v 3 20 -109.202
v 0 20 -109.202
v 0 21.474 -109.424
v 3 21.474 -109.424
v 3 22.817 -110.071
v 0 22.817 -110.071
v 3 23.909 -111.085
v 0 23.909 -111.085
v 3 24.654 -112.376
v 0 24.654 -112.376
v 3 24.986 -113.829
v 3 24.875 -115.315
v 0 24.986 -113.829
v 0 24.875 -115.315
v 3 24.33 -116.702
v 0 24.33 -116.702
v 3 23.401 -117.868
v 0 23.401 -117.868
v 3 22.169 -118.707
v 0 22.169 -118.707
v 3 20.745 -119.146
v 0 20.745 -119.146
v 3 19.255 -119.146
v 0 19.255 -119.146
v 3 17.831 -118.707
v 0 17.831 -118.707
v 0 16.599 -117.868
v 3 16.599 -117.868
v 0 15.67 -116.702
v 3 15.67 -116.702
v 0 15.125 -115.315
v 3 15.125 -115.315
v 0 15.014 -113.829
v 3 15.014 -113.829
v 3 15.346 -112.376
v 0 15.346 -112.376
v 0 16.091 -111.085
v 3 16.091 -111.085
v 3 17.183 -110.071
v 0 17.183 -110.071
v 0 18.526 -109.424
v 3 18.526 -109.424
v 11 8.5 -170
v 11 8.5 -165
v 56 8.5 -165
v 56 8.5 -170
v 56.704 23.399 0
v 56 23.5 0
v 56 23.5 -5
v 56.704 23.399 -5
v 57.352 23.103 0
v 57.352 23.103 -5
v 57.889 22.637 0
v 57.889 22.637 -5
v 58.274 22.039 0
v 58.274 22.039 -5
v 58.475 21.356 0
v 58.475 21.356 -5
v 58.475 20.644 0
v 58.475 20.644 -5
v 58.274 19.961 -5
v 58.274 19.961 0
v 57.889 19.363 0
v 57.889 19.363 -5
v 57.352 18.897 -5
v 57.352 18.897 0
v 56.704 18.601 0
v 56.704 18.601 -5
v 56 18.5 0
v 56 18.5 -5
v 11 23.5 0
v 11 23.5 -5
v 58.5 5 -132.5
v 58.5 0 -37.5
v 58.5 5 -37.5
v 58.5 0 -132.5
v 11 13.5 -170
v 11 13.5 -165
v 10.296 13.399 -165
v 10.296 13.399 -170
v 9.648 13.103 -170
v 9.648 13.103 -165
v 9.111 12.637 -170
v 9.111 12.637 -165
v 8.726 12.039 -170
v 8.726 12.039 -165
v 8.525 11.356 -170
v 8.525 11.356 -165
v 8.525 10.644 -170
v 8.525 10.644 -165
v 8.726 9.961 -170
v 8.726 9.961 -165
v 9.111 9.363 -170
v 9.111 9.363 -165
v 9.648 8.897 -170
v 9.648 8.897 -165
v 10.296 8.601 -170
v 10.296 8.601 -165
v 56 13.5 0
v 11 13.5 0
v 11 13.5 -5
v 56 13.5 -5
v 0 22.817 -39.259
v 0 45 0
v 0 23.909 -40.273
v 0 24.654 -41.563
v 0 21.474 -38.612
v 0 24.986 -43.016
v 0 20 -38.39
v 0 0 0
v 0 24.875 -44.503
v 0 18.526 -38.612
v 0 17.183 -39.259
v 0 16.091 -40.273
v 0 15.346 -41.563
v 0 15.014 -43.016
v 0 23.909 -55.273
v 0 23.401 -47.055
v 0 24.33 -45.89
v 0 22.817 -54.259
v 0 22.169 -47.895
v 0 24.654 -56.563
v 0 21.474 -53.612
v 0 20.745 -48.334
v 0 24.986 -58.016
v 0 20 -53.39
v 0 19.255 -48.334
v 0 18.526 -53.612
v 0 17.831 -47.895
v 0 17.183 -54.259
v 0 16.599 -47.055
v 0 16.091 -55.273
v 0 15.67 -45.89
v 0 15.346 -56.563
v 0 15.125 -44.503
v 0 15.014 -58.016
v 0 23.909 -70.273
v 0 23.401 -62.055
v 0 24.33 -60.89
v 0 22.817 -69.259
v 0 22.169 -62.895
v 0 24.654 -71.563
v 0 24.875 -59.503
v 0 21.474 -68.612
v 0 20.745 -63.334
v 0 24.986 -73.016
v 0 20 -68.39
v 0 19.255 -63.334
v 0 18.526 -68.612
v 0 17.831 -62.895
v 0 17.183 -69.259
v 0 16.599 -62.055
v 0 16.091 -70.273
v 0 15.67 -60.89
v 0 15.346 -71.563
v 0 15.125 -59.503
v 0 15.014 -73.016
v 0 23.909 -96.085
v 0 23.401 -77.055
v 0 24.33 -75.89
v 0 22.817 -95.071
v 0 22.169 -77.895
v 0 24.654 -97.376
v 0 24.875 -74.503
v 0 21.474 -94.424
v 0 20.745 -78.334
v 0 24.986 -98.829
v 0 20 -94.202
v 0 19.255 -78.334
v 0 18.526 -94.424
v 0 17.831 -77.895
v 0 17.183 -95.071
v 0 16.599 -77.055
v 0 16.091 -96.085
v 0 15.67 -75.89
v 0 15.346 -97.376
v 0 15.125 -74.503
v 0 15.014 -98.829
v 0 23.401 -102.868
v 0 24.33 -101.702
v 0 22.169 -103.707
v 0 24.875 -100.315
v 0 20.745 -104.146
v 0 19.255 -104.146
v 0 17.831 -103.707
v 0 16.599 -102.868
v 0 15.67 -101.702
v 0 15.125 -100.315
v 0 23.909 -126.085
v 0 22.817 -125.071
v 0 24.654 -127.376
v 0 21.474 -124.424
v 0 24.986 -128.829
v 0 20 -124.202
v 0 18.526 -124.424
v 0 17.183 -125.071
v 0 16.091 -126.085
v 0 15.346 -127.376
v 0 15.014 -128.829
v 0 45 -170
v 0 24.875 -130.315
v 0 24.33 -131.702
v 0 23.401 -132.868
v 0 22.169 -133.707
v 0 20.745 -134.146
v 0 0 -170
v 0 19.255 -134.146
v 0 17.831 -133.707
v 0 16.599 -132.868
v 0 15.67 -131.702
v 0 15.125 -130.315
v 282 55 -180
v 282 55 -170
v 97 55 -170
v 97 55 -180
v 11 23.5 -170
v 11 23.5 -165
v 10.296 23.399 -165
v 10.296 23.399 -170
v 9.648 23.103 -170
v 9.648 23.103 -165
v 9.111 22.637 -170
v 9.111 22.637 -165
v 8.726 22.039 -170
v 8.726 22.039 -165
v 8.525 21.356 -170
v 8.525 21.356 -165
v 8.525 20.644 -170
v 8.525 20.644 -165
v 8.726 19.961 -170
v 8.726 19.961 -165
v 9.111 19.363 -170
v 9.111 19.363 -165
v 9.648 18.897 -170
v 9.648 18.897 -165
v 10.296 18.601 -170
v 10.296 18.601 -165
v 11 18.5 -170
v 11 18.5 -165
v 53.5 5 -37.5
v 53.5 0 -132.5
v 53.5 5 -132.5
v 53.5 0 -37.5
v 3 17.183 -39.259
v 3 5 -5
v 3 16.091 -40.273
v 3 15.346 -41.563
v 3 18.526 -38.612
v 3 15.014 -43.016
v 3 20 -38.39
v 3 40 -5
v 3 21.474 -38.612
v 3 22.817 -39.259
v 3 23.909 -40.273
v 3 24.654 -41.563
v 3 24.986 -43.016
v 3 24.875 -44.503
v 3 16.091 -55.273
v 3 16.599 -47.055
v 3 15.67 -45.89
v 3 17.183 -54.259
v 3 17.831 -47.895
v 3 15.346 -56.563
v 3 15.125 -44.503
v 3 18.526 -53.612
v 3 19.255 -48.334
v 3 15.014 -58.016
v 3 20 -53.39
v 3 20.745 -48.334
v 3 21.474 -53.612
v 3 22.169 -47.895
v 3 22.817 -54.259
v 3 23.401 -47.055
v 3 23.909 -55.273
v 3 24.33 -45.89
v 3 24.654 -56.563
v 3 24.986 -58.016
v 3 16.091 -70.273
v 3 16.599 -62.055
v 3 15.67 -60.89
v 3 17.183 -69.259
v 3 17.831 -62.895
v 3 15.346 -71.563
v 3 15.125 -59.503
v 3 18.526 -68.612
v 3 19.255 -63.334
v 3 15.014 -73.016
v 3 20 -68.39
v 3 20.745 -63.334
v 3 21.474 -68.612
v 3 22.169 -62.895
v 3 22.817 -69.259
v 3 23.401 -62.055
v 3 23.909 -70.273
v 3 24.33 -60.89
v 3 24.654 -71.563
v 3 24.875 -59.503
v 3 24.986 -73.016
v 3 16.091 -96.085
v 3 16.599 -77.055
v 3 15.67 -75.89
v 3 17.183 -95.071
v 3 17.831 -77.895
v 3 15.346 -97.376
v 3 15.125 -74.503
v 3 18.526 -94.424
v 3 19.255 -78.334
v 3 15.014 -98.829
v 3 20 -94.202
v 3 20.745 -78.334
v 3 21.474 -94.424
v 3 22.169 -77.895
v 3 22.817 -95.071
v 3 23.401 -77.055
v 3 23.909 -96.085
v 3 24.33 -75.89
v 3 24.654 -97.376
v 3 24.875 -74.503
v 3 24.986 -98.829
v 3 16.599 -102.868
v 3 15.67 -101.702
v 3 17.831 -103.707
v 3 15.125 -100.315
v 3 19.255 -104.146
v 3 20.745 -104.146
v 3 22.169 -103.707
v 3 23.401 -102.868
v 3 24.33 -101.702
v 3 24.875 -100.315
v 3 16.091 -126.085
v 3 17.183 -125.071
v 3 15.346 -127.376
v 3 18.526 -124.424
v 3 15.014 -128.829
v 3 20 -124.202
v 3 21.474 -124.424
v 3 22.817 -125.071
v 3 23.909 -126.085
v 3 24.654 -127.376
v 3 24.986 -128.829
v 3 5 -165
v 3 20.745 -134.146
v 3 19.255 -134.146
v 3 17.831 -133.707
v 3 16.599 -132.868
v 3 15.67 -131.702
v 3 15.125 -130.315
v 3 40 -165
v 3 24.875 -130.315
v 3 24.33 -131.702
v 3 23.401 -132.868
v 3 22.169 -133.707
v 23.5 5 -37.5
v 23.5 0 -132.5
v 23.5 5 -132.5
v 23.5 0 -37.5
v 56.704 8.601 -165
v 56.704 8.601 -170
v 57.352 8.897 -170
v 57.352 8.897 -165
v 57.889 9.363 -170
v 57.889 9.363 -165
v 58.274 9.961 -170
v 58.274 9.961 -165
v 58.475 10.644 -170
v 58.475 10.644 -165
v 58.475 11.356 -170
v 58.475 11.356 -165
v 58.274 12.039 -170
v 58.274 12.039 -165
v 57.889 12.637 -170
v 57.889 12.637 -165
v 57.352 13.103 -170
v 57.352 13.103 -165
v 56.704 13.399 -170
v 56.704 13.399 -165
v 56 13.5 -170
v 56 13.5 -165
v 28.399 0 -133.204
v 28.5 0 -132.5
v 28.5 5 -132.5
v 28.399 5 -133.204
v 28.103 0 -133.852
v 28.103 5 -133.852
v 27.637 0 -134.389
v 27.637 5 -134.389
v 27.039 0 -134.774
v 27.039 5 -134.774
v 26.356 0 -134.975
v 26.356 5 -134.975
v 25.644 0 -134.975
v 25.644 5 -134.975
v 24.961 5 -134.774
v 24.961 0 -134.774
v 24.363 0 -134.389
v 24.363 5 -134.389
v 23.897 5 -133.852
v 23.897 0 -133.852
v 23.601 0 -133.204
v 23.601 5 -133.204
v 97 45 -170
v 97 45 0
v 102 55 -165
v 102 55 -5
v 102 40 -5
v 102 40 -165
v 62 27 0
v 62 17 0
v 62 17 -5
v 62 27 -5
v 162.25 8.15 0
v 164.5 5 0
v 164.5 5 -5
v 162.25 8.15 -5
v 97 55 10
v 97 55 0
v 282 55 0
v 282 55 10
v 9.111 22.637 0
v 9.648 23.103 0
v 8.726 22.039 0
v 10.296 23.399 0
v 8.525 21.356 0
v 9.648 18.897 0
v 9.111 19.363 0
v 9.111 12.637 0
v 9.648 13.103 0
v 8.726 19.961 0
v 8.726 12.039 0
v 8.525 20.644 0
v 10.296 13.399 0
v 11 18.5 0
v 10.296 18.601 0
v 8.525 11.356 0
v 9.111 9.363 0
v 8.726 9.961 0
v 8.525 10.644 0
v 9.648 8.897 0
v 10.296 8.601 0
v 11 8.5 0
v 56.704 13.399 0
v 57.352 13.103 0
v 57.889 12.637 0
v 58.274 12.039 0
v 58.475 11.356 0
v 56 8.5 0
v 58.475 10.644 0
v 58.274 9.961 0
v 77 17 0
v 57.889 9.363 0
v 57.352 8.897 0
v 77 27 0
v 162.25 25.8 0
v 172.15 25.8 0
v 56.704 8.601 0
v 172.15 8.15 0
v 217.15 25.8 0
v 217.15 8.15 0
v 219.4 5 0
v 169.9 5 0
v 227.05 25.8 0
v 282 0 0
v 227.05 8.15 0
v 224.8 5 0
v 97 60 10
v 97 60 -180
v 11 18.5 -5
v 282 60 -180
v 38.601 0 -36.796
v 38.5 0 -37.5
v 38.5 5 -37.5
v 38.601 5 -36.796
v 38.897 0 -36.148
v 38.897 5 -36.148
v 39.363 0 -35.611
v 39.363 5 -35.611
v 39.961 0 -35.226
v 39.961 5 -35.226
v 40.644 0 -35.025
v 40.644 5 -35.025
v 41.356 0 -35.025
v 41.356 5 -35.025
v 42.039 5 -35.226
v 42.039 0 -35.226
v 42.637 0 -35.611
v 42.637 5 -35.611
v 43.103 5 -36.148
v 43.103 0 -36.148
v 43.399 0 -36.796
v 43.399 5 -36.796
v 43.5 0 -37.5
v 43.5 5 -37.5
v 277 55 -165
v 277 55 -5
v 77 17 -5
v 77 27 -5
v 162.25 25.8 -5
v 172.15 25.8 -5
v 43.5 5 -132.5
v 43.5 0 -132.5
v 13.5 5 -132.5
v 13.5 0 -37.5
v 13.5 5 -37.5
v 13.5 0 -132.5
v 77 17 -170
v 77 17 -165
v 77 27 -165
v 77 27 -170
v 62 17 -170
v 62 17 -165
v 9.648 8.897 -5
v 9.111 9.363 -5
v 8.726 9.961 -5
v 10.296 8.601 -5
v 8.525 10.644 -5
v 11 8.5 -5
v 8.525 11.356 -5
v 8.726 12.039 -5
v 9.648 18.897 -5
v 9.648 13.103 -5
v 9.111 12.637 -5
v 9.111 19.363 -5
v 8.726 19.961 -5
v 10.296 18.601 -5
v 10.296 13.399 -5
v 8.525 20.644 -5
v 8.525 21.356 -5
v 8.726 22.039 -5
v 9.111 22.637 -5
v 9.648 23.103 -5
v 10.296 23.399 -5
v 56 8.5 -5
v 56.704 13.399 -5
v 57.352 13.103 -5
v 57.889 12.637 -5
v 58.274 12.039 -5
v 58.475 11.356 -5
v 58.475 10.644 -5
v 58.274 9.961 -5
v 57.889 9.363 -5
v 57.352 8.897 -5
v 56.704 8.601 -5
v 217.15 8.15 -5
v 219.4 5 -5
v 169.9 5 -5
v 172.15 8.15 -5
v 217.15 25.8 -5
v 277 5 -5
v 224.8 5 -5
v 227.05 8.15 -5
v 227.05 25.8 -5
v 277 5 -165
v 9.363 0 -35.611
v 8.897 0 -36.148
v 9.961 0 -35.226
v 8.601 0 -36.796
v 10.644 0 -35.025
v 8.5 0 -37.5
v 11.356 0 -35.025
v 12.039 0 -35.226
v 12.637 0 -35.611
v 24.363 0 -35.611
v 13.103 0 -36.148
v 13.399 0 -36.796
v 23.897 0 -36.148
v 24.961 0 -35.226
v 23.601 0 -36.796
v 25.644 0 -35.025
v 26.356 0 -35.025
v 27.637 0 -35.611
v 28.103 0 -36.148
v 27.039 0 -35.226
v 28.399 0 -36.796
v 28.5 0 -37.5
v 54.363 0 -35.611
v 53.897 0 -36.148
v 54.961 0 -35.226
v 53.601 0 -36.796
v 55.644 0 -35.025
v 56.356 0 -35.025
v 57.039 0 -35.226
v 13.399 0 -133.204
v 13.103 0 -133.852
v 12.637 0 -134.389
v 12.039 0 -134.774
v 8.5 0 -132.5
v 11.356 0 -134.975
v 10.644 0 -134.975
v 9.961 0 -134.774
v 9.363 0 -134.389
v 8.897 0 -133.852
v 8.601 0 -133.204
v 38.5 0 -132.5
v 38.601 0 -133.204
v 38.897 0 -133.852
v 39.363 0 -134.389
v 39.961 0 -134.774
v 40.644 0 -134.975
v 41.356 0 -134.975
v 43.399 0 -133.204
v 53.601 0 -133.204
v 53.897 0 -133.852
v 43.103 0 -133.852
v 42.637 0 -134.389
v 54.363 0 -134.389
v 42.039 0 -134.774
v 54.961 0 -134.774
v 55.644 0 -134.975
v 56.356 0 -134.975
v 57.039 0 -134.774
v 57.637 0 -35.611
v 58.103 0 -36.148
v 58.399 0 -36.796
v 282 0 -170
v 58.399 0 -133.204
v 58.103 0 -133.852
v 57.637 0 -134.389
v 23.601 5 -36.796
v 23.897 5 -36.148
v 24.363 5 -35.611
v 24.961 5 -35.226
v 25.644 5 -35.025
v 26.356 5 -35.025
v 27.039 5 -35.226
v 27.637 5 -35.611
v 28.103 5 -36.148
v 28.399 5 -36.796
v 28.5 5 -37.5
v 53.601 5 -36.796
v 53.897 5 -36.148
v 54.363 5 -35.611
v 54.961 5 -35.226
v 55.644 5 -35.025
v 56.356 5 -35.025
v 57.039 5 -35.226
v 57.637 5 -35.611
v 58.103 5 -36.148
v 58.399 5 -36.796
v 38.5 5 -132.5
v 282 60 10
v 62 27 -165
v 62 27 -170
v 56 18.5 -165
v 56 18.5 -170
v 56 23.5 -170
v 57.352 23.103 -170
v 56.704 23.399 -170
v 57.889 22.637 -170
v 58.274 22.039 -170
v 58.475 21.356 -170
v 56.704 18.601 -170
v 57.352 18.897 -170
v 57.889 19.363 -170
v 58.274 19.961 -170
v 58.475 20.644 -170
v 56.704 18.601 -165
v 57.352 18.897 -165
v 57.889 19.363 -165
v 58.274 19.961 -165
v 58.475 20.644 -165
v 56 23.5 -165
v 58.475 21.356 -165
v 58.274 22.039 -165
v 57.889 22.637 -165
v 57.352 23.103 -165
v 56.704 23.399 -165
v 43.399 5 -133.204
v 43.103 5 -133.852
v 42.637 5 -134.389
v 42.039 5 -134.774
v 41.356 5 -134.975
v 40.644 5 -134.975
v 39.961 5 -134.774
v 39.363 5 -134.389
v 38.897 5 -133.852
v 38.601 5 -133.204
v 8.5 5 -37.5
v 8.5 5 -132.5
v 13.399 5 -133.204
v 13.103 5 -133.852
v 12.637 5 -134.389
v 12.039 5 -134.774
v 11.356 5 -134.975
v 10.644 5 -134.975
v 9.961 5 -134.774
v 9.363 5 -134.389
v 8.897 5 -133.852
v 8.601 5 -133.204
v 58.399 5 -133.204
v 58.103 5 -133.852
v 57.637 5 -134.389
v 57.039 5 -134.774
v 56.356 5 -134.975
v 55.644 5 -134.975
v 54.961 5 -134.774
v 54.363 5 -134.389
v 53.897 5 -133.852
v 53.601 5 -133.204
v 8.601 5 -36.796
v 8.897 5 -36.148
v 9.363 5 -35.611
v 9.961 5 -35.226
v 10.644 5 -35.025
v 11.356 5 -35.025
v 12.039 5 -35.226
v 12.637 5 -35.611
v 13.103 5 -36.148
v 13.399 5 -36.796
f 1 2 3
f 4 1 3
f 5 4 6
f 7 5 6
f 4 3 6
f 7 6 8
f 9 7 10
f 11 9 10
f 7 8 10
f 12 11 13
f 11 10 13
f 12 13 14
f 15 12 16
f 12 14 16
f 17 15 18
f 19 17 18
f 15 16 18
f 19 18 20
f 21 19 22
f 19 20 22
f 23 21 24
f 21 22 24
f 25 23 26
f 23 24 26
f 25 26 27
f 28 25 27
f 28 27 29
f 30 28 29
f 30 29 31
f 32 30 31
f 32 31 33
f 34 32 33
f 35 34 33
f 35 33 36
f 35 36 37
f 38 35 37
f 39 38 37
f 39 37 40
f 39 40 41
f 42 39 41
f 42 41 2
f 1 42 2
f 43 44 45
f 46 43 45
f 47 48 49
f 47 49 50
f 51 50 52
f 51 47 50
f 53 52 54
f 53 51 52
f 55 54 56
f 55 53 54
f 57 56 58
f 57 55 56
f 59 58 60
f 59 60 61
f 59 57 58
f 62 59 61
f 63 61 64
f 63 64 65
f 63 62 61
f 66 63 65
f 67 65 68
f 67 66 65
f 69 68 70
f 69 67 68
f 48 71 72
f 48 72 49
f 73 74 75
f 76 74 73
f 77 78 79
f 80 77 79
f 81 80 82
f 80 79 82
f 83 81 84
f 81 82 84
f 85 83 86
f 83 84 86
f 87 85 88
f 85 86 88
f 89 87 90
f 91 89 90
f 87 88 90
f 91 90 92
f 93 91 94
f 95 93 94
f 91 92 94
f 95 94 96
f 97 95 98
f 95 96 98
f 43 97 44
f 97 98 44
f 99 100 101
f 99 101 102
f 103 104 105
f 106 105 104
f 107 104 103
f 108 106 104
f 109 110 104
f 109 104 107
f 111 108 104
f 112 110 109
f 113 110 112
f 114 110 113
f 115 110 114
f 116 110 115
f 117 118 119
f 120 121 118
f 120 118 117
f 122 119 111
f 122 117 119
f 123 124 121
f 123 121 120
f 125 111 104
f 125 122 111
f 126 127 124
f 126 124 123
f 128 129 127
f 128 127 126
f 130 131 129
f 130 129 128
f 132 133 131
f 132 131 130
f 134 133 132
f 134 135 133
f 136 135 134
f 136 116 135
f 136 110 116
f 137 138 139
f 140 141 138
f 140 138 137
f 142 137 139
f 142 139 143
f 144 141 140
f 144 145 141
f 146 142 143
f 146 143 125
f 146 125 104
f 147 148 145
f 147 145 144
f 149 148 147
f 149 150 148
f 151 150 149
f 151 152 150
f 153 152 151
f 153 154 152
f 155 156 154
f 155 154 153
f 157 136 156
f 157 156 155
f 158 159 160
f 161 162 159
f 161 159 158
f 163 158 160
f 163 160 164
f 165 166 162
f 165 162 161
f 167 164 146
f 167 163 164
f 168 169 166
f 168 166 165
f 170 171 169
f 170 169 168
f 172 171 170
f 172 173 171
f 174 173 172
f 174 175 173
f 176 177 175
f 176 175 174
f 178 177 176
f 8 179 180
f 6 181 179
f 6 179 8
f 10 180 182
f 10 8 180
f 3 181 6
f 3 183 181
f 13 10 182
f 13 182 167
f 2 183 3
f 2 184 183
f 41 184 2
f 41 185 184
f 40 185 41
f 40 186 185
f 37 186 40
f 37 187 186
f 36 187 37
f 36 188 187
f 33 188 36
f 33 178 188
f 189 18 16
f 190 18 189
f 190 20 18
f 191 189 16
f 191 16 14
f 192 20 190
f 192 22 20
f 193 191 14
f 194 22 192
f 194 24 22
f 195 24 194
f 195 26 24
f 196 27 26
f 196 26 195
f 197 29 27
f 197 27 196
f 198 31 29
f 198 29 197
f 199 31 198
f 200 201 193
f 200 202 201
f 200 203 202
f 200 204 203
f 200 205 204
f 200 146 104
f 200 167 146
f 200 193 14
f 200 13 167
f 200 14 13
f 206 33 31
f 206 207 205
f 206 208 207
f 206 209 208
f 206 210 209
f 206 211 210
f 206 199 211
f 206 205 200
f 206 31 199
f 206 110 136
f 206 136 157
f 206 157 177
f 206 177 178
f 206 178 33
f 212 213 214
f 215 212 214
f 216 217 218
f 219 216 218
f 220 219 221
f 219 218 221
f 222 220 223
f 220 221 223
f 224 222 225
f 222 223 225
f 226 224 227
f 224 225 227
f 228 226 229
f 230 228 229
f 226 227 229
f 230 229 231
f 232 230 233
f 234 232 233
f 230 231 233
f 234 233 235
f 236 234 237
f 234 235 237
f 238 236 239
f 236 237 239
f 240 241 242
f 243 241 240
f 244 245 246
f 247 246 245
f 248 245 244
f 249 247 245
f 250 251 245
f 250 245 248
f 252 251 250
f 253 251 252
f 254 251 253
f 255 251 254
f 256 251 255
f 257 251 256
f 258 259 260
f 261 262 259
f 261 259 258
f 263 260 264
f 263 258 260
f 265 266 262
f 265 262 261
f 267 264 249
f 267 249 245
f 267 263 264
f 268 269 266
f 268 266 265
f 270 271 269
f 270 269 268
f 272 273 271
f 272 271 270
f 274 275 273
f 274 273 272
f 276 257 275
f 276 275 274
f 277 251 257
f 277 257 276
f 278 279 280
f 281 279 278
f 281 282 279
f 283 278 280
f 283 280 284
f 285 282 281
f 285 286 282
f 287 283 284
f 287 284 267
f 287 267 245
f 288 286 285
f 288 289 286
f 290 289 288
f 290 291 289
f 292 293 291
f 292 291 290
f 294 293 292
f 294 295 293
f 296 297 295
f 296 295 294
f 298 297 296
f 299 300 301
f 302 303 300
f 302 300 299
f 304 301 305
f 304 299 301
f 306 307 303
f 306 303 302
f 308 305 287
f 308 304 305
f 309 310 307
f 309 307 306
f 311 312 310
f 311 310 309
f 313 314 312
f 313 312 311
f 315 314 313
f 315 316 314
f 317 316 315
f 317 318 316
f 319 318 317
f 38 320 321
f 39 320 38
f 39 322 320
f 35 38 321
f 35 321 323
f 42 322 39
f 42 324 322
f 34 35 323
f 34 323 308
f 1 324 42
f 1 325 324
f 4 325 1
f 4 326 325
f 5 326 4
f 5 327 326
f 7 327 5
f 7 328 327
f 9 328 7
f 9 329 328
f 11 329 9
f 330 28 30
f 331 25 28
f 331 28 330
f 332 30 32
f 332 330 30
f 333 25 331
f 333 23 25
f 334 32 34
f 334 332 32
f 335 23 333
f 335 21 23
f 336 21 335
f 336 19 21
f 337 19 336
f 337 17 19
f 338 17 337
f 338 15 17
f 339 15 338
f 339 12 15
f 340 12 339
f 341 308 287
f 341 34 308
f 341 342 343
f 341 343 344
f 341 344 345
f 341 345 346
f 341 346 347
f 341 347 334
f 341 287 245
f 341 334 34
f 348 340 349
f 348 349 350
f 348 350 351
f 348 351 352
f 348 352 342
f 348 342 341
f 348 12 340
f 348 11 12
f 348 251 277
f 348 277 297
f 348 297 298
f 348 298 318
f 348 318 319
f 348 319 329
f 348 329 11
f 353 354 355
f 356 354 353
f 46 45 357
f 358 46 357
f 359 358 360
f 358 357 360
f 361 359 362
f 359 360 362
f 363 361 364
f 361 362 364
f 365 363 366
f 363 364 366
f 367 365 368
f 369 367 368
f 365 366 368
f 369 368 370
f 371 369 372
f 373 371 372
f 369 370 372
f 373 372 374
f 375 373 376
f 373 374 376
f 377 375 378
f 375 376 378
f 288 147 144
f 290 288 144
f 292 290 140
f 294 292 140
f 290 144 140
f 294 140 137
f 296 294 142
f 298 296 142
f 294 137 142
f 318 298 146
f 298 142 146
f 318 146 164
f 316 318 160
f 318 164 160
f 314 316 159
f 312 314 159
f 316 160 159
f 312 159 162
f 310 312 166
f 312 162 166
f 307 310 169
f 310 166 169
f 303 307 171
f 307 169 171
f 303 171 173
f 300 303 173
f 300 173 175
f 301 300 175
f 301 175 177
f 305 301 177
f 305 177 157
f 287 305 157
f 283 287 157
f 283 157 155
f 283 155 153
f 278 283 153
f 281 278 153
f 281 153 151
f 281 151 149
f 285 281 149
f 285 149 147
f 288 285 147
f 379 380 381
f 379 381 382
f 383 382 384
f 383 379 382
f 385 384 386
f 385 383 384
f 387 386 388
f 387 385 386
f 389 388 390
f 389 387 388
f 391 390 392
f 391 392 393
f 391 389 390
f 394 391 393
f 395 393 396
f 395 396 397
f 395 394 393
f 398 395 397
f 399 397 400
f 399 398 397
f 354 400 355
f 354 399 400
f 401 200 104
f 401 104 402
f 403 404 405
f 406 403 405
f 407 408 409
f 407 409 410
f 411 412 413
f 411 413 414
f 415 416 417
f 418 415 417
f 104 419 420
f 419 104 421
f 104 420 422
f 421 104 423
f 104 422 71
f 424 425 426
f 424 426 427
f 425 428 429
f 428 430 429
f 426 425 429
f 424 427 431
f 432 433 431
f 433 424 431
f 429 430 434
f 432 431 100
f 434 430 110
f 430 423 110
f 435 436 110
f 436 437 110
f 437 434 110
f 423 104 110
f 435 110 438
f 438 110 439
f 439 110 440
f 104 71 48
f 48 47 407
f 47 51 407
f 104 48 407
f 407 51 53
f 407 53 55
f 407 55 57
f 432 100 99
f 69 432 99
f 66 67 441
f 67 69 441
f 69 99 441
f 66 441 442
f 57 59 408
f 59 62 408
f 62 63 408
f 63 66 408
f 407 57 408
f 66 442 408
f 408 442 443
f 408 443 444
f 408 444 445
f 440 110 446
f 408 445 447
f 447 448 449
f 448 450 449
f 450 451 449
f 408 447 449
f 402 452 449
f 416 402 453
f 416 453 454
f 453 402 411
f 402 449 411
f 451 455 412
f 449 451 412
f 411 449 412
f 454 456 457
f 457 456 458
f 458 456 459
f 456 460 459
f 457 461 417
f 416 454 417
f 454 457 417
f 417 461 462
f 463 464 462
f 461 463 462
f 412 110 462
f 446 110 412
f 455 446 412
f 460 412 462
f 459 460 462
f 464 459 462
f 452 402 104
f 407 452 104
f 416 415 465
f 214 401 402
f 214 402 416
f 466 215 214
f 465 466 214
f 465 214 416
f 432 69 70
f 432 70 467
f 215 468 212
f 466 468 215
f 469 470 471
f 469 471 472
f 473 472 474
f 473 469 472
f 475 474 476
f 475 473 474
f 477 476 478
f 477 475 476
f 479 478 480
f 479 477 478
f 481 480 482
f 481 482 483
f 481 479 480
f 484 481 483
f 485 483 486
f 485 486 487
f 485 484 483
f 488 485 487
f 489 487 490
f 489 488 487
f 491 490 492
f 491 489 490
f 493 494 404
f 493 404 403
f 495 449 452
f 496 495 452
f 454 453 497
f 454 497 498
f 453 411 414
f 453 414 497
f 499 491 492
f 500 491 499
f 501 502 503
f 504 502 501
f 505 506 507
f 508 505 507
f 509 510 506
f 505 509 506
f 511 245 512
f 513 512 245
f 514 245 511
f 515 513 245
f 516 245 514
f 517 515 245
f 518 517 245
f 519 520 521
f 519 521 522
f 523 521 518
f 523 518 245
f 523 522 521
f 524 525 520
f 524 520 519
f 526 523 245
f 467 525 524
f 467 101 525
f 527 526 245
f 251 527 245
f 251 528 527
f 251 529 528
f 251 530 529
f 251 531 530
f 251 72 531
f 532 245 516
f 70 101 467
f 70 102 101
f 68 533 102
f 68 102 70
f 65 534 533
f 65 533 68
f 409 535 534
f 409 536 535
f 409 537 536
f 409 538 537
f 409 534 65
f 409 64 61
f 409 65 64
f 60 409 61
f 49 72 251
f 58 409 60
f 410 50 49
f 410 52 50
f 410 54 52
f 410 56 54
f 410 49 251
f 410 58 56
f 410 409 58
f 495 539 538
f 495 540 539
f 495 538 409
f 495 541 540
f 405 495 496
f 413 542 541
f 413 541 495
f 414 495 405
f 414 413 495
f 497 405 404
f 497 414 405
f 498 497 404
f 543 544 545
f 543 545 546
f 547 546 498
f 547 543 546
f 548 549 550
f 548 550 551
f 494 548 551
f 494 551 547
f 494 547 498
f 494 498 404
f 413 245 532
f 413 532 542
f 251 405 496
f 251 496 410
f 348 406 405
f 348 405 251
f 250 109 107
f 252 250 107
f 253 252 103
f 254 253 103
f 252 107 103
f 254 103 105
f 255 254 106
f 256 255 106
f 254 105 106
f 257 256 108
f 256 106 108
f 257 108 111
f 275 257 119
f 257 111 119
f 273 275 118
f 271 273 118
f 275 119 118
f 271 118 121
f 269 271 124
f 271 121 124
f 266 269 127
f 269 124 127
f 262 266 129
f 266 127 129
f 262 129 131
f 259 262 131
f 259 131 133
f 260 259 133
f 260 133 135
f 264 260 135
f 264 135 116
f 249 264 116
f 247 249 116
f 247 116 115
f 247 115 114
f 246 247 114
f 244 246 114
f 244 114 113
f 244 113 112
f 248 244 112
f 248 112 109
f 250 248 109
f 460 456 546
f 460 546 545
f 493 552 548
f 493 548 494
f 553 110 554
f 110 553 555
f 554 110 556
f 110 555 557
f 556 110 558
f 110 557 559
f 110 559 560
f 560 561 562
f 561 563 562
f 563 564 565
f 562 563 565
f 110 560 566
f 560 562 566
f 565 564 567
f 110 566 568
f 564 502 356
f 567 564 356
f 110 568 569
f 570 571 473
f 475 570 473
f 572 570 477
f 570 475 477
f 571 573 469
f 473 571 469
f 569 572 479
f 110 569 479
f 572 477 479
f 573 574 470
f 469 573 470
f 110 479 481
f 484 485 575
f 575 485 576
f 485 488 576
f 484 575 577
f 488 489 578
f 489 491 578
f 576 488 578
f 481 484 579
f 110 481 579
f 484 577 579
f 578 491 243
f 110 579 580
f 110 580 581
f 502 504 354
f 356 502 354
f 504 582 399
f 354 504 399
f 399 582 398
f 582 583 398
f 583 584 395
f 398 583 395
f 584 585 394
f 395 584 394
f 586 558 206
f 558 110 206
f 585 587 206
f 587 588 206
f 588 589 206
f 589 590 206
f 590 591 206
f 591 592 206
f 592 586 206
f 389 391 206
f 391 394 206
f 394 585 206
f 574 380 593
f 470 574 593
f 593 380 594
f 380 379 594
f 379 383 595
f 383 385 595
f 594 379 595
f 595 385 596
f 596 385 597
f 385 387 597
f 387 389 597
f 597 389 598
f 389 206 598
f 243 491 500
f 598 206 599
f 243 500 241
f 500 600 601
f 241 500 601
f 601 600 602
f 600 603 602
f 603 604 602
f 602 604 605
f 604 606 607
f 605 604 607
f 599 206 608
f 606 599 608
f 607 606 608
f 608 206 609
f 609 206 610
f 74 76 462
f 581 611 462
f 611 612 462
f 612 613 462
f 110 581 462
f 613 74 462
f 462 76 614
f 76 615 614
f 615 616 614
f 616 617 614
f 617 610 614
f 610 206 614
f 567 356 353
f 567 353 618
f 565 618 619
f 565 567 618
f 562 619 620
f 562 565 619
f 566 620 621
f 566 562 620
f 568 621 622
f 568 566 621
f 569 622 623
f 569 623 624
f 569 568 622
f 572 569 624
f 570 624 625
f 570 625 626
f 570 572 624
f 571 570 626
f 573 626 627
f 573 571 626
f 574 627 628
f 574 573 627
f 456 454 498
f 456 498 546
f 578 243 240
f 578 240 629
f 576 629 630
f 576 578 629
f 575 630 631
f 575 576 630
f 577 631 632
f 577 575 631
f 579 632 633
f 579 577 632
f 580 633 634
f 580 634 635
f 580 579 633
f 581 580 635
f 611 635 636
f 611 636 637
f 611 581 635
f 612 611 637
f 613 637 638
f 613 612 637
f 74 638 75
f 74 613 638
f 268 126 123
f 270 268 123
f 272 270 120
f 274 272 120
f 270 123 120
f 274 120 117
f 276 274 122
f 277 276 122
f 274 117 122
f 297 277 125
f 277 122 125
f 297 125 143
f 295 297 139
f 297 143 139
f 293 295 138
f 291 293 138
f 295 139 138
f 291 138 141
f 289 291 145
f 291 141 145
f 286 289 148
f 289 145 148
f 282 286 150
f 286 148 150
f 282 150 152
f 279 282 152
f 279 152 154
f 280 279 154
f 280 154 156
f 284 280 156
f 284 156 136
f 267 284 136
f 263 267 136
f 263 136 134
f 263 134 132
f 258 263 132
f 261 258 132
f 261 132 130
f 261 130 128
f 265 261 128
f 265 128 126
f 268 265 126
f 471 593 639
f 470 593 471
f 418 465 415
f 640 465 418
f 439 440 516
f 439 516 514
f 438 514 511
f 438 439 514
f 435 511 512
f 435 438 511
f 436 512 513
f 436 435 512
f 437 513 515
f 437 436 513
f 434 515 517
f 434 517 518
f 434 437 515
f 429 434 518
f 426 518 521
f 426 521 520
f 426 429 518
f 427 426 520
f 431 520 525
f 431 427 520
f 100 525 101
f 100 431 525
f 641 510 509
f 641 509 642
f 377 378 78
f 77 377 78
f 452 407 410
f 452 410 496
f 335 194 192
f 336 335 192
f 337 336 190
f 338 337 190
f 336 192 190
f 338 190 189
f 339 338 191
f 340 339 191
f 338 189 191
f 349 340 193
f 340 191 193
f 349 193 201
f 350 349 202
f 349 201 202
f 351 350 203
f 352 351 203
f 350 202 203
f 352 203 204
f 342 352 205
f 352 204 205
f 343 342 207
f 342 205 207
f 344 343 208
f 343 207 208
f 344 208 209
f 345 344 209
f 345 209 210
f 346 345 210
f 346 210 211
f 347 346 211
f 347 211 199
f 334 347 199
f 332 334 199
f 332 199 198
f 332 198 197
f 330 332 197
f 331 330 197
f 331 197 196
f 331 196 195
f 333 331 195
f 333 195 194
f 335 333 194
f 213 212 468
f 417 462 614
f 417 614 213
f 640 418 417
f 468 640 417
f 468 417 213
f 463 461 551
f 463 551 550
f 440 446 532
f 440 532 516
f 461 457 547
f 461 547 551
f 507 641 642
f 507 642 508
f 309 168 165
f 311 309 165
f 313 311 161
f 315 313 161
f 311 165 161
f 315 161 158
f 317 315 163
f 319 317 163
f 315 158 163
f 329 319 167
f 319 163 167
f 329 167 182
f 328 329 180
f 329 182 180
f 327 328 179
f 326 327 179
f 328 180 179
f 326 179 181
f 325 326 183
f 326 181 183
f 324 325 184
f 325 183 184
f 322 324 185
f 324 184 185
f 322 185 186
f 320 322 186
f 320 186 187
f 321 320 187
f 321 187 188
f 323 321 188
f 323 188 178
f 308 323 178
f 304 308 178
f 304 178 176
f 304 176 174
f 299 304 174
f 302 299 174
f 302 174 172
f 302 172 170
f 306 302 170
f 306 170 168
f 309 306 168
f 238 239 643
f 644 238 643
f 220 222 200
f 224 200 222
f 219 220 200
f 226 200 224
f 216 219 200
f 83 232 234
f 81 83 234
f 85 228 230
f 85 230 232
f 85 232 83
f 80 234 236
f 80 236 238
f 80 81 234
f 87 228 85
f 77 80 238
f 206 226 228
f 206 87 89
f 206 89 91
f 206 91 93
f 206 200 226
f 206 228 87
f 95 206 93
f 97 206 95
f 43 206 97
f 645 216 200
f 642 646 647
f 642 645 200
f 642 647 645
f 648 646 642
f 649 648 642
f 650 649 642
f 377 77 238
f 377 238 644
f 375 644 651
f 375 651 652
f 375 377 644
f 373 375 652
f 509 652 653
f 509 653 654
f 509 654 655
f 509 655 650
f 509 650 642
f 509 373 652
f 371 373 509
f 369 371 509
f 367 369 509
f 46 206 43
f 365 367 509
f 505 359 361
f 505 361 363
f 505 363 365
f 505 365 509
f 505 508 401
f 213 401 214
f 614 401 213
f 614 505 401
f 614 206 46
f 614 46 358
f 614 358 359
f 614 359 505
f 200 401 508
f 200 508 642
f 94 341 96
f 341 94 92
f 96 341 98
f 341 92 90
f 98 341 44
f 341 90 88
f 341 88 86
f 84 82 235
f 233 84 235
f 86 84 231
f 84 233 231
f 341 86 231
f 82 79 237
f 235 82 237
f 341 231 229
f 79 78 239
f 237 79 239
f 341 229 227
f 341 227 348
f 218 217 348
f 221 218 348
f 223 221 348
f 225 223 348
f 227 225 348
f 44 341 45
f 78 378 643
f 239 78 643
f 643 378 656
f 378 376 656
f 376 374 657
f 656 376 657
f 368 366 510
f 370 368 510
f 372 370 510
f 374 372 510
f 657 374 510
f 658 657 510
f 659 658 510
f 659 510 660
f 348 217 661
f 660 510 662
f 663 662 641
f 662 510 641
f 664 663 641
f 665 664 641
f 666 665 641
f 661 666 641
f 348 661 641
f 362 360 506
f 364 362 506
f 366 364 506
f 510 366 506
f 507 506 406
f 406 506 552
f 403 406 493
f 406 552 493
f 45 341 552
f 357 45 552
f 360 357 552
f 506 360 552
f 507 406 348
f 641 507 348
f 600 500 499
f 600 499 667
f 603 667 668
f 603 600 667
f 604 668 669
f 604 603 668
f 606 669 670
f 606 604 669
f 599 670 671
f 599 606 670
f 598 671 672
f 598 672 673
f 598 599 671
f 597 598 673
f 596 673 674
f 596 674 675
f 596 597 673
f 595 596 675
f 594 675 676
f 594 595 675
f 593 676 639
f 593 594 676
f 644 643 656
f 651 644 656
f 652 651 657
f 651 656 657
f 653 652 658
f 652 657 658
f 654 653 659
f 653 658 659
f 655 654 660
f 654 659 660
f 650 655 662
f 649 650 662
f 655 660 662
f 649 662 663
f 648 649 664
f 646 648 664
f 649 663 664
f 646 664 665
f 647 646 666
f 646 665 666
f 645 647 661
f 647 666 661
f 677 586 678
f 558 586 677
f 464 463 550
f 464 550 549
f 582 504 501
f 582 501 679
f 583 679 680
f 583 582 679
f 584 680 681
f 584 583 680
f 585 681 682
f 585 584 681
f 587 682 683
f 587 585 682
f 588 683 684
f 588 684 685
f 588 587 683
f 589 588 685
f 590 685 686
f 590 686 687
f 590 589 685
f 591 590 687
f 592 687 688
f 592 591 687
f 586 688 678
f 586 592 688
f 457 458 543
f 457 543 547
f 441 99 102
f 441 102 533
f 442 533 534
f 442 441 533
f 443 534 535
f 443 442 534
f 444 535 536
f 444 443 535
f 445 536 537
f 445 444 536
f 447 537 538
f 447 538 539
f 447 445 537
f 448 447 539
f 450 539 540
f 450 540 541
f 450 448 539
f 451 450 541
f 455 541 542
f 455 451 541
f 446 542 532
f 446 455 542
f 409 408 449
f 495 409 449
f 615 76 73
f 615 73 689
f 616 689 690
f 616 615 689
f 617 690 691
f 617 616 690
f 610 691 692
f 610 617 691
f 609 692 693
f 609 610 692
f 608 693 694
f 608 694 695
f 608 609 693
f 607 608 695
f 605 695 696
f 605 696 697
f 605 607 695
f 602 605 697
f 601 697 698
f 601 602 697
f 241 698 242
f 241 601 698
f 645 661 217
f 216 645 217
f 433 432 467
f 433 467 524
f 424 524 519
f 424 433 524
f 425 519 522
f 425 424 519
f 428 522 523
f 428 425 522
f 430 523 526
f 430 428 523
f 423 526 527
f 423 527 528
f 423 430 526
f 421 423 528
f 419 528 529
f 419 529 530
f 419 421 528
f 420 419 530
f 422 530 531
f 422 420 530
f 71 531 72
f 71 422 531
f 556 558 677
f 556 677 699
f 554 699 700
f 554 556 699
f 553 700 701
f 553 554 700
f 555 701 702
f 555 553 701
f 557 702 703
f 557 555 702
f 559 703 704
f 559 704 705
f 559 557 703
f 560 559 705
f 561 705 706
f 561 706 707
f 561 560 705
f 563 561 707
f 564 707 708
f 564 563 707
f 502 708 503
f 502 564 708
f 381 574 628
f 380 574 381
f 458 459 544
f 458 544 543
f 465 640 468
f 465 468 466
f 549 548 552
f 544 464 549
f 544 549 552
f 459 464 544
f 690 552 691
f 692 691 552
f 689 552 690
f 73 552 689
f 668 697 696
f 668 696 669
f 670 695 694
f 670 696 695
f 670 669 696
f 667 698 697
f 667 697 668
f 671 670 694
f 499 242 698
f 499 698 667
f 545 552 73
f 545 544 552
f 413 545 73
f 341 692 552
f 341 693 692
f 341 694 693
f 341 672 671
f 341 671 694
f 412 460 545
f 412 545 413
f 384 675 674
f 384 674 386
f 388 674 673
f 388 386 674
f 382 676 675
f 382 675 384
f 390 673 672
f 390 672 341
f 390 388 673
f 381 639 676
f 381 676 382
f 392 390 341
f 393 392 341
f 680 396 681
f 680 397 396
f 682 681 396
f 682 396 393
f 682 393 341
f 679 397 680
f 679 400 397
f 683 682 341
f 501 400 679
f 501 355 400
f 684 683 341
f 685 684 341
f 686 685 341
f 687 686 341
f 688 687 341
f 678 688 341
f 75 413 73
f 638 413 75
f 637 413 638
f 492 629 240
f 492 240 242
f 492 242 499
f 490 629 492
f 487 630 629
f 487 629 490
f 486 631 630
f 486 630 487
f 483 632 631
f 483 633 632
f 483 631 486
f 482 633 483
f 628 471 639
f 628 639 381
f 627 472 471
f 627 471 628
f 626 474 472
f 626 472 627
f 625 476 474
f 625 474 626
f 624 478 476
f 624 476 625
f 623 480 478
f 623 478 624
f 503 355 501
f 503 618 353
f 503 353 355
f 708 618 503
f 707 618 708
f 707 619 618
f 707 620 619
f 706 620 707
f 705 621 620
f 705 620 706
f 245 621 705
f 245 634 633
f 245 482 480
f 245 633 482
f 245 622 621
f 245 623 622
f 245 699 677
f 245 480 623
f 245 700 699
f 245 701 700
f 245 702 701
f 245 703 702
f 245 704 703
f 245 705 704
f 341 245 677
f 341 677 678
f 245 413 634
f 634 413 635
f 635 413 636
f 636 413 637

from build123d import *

# Parameters (mm, degrees)
SKETCH1_W           = 282
SKETCH1_H           = 170
BOSS_EXTRUDE1_DEPTH = 60
CUT_EXTRUDE4_DEPTH  = 5
SKETCH8_W           = 160
SKETCH8_H           = 50
CUT_EXTRUDE5_DEPTH  = 279
CUT_EXTRUDE6_DEPTH  = 5
SKETCH10_R          = 5
CUT_EXTRUDE7_DEPTH  = 5
CUT_EXTRUDE8_DEPTH  = 5
CUT_EXTRUDE9_START  = -5
CUT_EXTRUDE9_DEPTH  = 5
SKETCH14_W          = 185
SKETCH14_H          = 5
BOSS_EXTRUDE2_DEPTH = 10
SKETCH15_W          = 185
SKETCH15_H          = 5
BOSS_EXTRUDE3_DEPTH = 10
SKETCH16_W          = 97
SKETCH16_H          = 15
CUT_EXTRUDE10_DEPTH = 170
BOSS_EXTRUDE4_DEPTH = 160
SKETCH18_W          = 15
SKETCH18_H          = 10
CUT_EXTRUDE11_DEPTH = 340.888216918
BOSS_EXTRUDE5_REACH = 339.267
SKETCH19_W          = 5
SKETCH19_H          = 50


with BuildPart() as part:
    # Sketch1 → Boss-Extrude1 (new body)
    with BuildSketch(Plane(origin=(0, 0, 0), x_dir=(1, 0, 0), z_dir=(0, 1, 0))):
        with Locations((141, 85)):
            Rectangle(SKETCH1_W, SKETCH1_H)
    extrude(amount=BOSS_EXTRUDE1_DEPTH)

    # Sketch7 → Cut-Extrude4 (cut)
    with BuildSketch(Plane.XZ):
        with BuildLine():
            Line((13.5, -37.5), (13.5, -132.5))
            ThreePointArc((13.5, -132.5), (11, -135), (8.5, -132.5))
            Line((8.5, -132.5), (8.5, -37.5))
            ThreePointArc((8.5, -37.5), (11, -35), (13.5, -37.5))
        make_face()
        with BuildLine():
            Line((58.5, -37.5), (58.5, -132.5))
            ThreePointArc((58.5, -132.5), (56, -135), (53.5, -132.5))
            Line((53.5, -132.5), (53.5, -37.5))
            ThreePointArc((53.5, -37.5), (56, -35), (58.5, -37.5))
        make_face()
        with BuildLine():
            Line((28.5, -37.5), (28.5, -132.5))
            ThreePointArc((28.5, -132.5), (26, -135), (23.5, -132.5))
            Line((23.5, -132.5), (23.5, -37.5))
            ThreePointArc((23.5, -37.5), (26, -35), (28.5, -37.5))
        make_face()
        with BuildLine():
            Line((43.5, -37.5), (43.5, -132.5))
            ThreePointArc((43.5, -132.5), (41, -135), (38.5, -132.5))
            Line((38.5, -132.5), (38.5, -37.5))
            ThreePointArc((38.5, -37.5), (41, -35), (43.5, -37.5))
        make_face()
    extrude(amount=-CUT_EXTRUDE4_DEPTH, mode=Mode.SUBTRACT)

    # Sketch8 → Cut-Extrude5 (cut)
    with BuildSketch(Plane(origin=(282, 0, 0), x_dir=(0, 0, -1), z_dir=(1, 0, 0))):
        with Locations((85, 30)):
            Rectangle(SKETCH8_W, SKETCH8_H)
    extrude(amount=-CUT_EXTRUDE5_DEPTH, mode=Mode.SUBTRACT)

    # Sketch9 → Cut-Extrude6 (cut)
    with BuildSketch(Plane.XY):
        Polygon((217.15, 25.8), (227.05, 25.8), (227.05, 8.15), (224.8, 5), (219.4, 5), (217.15, 8.15), align=None)
        Polygon((162.25, 25.8), (172.15, 25.8), (172.15, 8.15), (169.9, 5), (164.5, 5), (162.25, 8.15), align=None)
    extrude(amount=-CUT_EXTRUDE6_DEPTH, mode=Mode.SUBTRACT)

    # Sketch10 → Cut-Extrude7 (cut)
    with BuildSketch(Plane.ZY):
        with Locations((-129.202249563, 20)):
            Circle(SKETCH10_R)
        with Locations((-114.202249563, 20)):
            Circle(SKETCH10_R)
        with Locations((-99.202249563, 20)):
            Circle(SKETCH10_R)
        with Locations((-43.390057257, 20)):
            Circle(SKETCH10_R)
        with Locations((-58.390057257, 20)):
            Circle(SKETCH10_R)
        with Locations((-73.390057257, 20)):
            Circle(SKETCH10_R)
    extrude(amount=-CUT_EXTRUDE7_DEPTH, mode=Mode.SUBTRACT)

    # Sketch11 → Cut-Extrude8 (cut)
    with BuildSketch(Plane.XY):
        with BuildLine():
            Line((11, 13.5), (56, 13.5))
            ThreePointArc((56, 13.5), (58.5, 11), (56, 8.5))
            Line((56, 8.5), (11, 8.5))
            ThreePointArc((11, 8.5), (8.5, 11), (11, 13.5))
        make_face()
        with BuildLine():
            Line((11, 23.5), (56, 23.5))
            ThreePointArc((56, 23.5), (58.5, 21), (56, 18.5))
            Line((56, 18.5), (11, 18.5))
            ThreePointArc((11, 18.5), (8.5, 21), (11, 23.5))
        make_face()
    extrude(amount=-CUT_EXTRUDE8_DEPTH, mode=Mode.SUBTRACT)

    # Sketch12 → Cut-Extrude9 (cut)
    with BuildSketch(Plane(origin=(0, 0, -170), x_dir=(-1, 0, 0), z_dir=(0, 0, -1)).offset(CUT_EXTRUDE9_START)):
        with BuildLine():
            Line((-56, 13.5), (-11, 13.5))
            ThreePointArc((-11, 13.5), (-8.5, 11), (-11, 8.5))
            Line((-11, 8.5), (-56, 8.5))
            ThreePointArc((-56, 8.5), (-58.5, 11), (-56, 13.5))
        make_face()
        with BuildLine():
            Line((-56, 23.5), (-11, 23.5))
            ThreePointArc((-11, 23.5), (-8.5, 21), (-11, 18.5))
            Line((-11, 18.5), (-56, 18.5))
            ThreePointArc((-56, 18.5), (-58.5, 21), (-56, 23.5))
        make_face()
    extrude(amount=CUT_EXTRUDE9_DEPTH, mode=Mode.SUBTRACT)

    # Sketch14 → Boss-Extrude2 (add)
    with BuildSketch(Plane.XY):
        with Locations((189.5, 57.5)):
            Rectangle(SKETCH14_W, SKETCH14_H)
    extrude(amount=BOSS_EXTRUDE2_DEPTH)

    # Sketch15 → Boss-Extrude3 (add)
    with BuildSketch(Plane(origin=(0, 0, -170), x_dir=(-1, 0, 0), z_dir=(0, 0, -1))):
        with Locations((-189.5, 57.5)):
            Rectangle(SKETCH15_W, SKETCH15_H)
    extrude(amount=BOSS_EXTRUDE3_DEPTH)

    # Sketch16 → Cut-Extrude10 (cut)
    with BuildSketch(Plane.XY):
        with Locations((48.5, 52.5)):
            Rectangle(SKETCH16_W, SKETCH16_H)
    extrude(amount=-CUT_EXTRUDE10_DEPTH, mode=Mode.SUBTRACT)

    # Sketch17 → Boss-Extrude4 (add)
    with BuildSketch(Plane.XY.offset(-165)):
        Polygon((3, 45), (97, 45), (97, 55), (102, 55), (102, 40), (3, 40), align=None)
    extrude(amount=BOSS_EXTRUDE4_DEPTH)

    # Sketch18 → Cut-Extrude11 (cut, through all)
    with BuildSketch(Plane.XY):
        with Locations((69.5, 22)):
            Rectangle(SKETCH18_W, SKETCH18_H)
    extrude(amount=-CUT_EXTRUDE11_DEPTH, mode=Mode.SUBTRACT)

    # Sketch19 → Boss-Extrude5 (add, up to next)
    with BuildSketch(Plane.XY.offset(-165), mode=Mode.PRIVATE) as boss_extrude5_sk1:
        with Locations((279.5, 30)):
            Rectangle(SKETCH19_W, SKETCH19_H)
    boss_extrude5_tool1 = extrude(boss_extrude5_sk1.sketch, amount=BOSS_EXTRUDE5_REACH, mode=Mode.PRIVATE) - part.part
    add(boss_extrude5_tool1.solids().sort_by_distance((279.5, 30, -165))[0])


solid = part.part
